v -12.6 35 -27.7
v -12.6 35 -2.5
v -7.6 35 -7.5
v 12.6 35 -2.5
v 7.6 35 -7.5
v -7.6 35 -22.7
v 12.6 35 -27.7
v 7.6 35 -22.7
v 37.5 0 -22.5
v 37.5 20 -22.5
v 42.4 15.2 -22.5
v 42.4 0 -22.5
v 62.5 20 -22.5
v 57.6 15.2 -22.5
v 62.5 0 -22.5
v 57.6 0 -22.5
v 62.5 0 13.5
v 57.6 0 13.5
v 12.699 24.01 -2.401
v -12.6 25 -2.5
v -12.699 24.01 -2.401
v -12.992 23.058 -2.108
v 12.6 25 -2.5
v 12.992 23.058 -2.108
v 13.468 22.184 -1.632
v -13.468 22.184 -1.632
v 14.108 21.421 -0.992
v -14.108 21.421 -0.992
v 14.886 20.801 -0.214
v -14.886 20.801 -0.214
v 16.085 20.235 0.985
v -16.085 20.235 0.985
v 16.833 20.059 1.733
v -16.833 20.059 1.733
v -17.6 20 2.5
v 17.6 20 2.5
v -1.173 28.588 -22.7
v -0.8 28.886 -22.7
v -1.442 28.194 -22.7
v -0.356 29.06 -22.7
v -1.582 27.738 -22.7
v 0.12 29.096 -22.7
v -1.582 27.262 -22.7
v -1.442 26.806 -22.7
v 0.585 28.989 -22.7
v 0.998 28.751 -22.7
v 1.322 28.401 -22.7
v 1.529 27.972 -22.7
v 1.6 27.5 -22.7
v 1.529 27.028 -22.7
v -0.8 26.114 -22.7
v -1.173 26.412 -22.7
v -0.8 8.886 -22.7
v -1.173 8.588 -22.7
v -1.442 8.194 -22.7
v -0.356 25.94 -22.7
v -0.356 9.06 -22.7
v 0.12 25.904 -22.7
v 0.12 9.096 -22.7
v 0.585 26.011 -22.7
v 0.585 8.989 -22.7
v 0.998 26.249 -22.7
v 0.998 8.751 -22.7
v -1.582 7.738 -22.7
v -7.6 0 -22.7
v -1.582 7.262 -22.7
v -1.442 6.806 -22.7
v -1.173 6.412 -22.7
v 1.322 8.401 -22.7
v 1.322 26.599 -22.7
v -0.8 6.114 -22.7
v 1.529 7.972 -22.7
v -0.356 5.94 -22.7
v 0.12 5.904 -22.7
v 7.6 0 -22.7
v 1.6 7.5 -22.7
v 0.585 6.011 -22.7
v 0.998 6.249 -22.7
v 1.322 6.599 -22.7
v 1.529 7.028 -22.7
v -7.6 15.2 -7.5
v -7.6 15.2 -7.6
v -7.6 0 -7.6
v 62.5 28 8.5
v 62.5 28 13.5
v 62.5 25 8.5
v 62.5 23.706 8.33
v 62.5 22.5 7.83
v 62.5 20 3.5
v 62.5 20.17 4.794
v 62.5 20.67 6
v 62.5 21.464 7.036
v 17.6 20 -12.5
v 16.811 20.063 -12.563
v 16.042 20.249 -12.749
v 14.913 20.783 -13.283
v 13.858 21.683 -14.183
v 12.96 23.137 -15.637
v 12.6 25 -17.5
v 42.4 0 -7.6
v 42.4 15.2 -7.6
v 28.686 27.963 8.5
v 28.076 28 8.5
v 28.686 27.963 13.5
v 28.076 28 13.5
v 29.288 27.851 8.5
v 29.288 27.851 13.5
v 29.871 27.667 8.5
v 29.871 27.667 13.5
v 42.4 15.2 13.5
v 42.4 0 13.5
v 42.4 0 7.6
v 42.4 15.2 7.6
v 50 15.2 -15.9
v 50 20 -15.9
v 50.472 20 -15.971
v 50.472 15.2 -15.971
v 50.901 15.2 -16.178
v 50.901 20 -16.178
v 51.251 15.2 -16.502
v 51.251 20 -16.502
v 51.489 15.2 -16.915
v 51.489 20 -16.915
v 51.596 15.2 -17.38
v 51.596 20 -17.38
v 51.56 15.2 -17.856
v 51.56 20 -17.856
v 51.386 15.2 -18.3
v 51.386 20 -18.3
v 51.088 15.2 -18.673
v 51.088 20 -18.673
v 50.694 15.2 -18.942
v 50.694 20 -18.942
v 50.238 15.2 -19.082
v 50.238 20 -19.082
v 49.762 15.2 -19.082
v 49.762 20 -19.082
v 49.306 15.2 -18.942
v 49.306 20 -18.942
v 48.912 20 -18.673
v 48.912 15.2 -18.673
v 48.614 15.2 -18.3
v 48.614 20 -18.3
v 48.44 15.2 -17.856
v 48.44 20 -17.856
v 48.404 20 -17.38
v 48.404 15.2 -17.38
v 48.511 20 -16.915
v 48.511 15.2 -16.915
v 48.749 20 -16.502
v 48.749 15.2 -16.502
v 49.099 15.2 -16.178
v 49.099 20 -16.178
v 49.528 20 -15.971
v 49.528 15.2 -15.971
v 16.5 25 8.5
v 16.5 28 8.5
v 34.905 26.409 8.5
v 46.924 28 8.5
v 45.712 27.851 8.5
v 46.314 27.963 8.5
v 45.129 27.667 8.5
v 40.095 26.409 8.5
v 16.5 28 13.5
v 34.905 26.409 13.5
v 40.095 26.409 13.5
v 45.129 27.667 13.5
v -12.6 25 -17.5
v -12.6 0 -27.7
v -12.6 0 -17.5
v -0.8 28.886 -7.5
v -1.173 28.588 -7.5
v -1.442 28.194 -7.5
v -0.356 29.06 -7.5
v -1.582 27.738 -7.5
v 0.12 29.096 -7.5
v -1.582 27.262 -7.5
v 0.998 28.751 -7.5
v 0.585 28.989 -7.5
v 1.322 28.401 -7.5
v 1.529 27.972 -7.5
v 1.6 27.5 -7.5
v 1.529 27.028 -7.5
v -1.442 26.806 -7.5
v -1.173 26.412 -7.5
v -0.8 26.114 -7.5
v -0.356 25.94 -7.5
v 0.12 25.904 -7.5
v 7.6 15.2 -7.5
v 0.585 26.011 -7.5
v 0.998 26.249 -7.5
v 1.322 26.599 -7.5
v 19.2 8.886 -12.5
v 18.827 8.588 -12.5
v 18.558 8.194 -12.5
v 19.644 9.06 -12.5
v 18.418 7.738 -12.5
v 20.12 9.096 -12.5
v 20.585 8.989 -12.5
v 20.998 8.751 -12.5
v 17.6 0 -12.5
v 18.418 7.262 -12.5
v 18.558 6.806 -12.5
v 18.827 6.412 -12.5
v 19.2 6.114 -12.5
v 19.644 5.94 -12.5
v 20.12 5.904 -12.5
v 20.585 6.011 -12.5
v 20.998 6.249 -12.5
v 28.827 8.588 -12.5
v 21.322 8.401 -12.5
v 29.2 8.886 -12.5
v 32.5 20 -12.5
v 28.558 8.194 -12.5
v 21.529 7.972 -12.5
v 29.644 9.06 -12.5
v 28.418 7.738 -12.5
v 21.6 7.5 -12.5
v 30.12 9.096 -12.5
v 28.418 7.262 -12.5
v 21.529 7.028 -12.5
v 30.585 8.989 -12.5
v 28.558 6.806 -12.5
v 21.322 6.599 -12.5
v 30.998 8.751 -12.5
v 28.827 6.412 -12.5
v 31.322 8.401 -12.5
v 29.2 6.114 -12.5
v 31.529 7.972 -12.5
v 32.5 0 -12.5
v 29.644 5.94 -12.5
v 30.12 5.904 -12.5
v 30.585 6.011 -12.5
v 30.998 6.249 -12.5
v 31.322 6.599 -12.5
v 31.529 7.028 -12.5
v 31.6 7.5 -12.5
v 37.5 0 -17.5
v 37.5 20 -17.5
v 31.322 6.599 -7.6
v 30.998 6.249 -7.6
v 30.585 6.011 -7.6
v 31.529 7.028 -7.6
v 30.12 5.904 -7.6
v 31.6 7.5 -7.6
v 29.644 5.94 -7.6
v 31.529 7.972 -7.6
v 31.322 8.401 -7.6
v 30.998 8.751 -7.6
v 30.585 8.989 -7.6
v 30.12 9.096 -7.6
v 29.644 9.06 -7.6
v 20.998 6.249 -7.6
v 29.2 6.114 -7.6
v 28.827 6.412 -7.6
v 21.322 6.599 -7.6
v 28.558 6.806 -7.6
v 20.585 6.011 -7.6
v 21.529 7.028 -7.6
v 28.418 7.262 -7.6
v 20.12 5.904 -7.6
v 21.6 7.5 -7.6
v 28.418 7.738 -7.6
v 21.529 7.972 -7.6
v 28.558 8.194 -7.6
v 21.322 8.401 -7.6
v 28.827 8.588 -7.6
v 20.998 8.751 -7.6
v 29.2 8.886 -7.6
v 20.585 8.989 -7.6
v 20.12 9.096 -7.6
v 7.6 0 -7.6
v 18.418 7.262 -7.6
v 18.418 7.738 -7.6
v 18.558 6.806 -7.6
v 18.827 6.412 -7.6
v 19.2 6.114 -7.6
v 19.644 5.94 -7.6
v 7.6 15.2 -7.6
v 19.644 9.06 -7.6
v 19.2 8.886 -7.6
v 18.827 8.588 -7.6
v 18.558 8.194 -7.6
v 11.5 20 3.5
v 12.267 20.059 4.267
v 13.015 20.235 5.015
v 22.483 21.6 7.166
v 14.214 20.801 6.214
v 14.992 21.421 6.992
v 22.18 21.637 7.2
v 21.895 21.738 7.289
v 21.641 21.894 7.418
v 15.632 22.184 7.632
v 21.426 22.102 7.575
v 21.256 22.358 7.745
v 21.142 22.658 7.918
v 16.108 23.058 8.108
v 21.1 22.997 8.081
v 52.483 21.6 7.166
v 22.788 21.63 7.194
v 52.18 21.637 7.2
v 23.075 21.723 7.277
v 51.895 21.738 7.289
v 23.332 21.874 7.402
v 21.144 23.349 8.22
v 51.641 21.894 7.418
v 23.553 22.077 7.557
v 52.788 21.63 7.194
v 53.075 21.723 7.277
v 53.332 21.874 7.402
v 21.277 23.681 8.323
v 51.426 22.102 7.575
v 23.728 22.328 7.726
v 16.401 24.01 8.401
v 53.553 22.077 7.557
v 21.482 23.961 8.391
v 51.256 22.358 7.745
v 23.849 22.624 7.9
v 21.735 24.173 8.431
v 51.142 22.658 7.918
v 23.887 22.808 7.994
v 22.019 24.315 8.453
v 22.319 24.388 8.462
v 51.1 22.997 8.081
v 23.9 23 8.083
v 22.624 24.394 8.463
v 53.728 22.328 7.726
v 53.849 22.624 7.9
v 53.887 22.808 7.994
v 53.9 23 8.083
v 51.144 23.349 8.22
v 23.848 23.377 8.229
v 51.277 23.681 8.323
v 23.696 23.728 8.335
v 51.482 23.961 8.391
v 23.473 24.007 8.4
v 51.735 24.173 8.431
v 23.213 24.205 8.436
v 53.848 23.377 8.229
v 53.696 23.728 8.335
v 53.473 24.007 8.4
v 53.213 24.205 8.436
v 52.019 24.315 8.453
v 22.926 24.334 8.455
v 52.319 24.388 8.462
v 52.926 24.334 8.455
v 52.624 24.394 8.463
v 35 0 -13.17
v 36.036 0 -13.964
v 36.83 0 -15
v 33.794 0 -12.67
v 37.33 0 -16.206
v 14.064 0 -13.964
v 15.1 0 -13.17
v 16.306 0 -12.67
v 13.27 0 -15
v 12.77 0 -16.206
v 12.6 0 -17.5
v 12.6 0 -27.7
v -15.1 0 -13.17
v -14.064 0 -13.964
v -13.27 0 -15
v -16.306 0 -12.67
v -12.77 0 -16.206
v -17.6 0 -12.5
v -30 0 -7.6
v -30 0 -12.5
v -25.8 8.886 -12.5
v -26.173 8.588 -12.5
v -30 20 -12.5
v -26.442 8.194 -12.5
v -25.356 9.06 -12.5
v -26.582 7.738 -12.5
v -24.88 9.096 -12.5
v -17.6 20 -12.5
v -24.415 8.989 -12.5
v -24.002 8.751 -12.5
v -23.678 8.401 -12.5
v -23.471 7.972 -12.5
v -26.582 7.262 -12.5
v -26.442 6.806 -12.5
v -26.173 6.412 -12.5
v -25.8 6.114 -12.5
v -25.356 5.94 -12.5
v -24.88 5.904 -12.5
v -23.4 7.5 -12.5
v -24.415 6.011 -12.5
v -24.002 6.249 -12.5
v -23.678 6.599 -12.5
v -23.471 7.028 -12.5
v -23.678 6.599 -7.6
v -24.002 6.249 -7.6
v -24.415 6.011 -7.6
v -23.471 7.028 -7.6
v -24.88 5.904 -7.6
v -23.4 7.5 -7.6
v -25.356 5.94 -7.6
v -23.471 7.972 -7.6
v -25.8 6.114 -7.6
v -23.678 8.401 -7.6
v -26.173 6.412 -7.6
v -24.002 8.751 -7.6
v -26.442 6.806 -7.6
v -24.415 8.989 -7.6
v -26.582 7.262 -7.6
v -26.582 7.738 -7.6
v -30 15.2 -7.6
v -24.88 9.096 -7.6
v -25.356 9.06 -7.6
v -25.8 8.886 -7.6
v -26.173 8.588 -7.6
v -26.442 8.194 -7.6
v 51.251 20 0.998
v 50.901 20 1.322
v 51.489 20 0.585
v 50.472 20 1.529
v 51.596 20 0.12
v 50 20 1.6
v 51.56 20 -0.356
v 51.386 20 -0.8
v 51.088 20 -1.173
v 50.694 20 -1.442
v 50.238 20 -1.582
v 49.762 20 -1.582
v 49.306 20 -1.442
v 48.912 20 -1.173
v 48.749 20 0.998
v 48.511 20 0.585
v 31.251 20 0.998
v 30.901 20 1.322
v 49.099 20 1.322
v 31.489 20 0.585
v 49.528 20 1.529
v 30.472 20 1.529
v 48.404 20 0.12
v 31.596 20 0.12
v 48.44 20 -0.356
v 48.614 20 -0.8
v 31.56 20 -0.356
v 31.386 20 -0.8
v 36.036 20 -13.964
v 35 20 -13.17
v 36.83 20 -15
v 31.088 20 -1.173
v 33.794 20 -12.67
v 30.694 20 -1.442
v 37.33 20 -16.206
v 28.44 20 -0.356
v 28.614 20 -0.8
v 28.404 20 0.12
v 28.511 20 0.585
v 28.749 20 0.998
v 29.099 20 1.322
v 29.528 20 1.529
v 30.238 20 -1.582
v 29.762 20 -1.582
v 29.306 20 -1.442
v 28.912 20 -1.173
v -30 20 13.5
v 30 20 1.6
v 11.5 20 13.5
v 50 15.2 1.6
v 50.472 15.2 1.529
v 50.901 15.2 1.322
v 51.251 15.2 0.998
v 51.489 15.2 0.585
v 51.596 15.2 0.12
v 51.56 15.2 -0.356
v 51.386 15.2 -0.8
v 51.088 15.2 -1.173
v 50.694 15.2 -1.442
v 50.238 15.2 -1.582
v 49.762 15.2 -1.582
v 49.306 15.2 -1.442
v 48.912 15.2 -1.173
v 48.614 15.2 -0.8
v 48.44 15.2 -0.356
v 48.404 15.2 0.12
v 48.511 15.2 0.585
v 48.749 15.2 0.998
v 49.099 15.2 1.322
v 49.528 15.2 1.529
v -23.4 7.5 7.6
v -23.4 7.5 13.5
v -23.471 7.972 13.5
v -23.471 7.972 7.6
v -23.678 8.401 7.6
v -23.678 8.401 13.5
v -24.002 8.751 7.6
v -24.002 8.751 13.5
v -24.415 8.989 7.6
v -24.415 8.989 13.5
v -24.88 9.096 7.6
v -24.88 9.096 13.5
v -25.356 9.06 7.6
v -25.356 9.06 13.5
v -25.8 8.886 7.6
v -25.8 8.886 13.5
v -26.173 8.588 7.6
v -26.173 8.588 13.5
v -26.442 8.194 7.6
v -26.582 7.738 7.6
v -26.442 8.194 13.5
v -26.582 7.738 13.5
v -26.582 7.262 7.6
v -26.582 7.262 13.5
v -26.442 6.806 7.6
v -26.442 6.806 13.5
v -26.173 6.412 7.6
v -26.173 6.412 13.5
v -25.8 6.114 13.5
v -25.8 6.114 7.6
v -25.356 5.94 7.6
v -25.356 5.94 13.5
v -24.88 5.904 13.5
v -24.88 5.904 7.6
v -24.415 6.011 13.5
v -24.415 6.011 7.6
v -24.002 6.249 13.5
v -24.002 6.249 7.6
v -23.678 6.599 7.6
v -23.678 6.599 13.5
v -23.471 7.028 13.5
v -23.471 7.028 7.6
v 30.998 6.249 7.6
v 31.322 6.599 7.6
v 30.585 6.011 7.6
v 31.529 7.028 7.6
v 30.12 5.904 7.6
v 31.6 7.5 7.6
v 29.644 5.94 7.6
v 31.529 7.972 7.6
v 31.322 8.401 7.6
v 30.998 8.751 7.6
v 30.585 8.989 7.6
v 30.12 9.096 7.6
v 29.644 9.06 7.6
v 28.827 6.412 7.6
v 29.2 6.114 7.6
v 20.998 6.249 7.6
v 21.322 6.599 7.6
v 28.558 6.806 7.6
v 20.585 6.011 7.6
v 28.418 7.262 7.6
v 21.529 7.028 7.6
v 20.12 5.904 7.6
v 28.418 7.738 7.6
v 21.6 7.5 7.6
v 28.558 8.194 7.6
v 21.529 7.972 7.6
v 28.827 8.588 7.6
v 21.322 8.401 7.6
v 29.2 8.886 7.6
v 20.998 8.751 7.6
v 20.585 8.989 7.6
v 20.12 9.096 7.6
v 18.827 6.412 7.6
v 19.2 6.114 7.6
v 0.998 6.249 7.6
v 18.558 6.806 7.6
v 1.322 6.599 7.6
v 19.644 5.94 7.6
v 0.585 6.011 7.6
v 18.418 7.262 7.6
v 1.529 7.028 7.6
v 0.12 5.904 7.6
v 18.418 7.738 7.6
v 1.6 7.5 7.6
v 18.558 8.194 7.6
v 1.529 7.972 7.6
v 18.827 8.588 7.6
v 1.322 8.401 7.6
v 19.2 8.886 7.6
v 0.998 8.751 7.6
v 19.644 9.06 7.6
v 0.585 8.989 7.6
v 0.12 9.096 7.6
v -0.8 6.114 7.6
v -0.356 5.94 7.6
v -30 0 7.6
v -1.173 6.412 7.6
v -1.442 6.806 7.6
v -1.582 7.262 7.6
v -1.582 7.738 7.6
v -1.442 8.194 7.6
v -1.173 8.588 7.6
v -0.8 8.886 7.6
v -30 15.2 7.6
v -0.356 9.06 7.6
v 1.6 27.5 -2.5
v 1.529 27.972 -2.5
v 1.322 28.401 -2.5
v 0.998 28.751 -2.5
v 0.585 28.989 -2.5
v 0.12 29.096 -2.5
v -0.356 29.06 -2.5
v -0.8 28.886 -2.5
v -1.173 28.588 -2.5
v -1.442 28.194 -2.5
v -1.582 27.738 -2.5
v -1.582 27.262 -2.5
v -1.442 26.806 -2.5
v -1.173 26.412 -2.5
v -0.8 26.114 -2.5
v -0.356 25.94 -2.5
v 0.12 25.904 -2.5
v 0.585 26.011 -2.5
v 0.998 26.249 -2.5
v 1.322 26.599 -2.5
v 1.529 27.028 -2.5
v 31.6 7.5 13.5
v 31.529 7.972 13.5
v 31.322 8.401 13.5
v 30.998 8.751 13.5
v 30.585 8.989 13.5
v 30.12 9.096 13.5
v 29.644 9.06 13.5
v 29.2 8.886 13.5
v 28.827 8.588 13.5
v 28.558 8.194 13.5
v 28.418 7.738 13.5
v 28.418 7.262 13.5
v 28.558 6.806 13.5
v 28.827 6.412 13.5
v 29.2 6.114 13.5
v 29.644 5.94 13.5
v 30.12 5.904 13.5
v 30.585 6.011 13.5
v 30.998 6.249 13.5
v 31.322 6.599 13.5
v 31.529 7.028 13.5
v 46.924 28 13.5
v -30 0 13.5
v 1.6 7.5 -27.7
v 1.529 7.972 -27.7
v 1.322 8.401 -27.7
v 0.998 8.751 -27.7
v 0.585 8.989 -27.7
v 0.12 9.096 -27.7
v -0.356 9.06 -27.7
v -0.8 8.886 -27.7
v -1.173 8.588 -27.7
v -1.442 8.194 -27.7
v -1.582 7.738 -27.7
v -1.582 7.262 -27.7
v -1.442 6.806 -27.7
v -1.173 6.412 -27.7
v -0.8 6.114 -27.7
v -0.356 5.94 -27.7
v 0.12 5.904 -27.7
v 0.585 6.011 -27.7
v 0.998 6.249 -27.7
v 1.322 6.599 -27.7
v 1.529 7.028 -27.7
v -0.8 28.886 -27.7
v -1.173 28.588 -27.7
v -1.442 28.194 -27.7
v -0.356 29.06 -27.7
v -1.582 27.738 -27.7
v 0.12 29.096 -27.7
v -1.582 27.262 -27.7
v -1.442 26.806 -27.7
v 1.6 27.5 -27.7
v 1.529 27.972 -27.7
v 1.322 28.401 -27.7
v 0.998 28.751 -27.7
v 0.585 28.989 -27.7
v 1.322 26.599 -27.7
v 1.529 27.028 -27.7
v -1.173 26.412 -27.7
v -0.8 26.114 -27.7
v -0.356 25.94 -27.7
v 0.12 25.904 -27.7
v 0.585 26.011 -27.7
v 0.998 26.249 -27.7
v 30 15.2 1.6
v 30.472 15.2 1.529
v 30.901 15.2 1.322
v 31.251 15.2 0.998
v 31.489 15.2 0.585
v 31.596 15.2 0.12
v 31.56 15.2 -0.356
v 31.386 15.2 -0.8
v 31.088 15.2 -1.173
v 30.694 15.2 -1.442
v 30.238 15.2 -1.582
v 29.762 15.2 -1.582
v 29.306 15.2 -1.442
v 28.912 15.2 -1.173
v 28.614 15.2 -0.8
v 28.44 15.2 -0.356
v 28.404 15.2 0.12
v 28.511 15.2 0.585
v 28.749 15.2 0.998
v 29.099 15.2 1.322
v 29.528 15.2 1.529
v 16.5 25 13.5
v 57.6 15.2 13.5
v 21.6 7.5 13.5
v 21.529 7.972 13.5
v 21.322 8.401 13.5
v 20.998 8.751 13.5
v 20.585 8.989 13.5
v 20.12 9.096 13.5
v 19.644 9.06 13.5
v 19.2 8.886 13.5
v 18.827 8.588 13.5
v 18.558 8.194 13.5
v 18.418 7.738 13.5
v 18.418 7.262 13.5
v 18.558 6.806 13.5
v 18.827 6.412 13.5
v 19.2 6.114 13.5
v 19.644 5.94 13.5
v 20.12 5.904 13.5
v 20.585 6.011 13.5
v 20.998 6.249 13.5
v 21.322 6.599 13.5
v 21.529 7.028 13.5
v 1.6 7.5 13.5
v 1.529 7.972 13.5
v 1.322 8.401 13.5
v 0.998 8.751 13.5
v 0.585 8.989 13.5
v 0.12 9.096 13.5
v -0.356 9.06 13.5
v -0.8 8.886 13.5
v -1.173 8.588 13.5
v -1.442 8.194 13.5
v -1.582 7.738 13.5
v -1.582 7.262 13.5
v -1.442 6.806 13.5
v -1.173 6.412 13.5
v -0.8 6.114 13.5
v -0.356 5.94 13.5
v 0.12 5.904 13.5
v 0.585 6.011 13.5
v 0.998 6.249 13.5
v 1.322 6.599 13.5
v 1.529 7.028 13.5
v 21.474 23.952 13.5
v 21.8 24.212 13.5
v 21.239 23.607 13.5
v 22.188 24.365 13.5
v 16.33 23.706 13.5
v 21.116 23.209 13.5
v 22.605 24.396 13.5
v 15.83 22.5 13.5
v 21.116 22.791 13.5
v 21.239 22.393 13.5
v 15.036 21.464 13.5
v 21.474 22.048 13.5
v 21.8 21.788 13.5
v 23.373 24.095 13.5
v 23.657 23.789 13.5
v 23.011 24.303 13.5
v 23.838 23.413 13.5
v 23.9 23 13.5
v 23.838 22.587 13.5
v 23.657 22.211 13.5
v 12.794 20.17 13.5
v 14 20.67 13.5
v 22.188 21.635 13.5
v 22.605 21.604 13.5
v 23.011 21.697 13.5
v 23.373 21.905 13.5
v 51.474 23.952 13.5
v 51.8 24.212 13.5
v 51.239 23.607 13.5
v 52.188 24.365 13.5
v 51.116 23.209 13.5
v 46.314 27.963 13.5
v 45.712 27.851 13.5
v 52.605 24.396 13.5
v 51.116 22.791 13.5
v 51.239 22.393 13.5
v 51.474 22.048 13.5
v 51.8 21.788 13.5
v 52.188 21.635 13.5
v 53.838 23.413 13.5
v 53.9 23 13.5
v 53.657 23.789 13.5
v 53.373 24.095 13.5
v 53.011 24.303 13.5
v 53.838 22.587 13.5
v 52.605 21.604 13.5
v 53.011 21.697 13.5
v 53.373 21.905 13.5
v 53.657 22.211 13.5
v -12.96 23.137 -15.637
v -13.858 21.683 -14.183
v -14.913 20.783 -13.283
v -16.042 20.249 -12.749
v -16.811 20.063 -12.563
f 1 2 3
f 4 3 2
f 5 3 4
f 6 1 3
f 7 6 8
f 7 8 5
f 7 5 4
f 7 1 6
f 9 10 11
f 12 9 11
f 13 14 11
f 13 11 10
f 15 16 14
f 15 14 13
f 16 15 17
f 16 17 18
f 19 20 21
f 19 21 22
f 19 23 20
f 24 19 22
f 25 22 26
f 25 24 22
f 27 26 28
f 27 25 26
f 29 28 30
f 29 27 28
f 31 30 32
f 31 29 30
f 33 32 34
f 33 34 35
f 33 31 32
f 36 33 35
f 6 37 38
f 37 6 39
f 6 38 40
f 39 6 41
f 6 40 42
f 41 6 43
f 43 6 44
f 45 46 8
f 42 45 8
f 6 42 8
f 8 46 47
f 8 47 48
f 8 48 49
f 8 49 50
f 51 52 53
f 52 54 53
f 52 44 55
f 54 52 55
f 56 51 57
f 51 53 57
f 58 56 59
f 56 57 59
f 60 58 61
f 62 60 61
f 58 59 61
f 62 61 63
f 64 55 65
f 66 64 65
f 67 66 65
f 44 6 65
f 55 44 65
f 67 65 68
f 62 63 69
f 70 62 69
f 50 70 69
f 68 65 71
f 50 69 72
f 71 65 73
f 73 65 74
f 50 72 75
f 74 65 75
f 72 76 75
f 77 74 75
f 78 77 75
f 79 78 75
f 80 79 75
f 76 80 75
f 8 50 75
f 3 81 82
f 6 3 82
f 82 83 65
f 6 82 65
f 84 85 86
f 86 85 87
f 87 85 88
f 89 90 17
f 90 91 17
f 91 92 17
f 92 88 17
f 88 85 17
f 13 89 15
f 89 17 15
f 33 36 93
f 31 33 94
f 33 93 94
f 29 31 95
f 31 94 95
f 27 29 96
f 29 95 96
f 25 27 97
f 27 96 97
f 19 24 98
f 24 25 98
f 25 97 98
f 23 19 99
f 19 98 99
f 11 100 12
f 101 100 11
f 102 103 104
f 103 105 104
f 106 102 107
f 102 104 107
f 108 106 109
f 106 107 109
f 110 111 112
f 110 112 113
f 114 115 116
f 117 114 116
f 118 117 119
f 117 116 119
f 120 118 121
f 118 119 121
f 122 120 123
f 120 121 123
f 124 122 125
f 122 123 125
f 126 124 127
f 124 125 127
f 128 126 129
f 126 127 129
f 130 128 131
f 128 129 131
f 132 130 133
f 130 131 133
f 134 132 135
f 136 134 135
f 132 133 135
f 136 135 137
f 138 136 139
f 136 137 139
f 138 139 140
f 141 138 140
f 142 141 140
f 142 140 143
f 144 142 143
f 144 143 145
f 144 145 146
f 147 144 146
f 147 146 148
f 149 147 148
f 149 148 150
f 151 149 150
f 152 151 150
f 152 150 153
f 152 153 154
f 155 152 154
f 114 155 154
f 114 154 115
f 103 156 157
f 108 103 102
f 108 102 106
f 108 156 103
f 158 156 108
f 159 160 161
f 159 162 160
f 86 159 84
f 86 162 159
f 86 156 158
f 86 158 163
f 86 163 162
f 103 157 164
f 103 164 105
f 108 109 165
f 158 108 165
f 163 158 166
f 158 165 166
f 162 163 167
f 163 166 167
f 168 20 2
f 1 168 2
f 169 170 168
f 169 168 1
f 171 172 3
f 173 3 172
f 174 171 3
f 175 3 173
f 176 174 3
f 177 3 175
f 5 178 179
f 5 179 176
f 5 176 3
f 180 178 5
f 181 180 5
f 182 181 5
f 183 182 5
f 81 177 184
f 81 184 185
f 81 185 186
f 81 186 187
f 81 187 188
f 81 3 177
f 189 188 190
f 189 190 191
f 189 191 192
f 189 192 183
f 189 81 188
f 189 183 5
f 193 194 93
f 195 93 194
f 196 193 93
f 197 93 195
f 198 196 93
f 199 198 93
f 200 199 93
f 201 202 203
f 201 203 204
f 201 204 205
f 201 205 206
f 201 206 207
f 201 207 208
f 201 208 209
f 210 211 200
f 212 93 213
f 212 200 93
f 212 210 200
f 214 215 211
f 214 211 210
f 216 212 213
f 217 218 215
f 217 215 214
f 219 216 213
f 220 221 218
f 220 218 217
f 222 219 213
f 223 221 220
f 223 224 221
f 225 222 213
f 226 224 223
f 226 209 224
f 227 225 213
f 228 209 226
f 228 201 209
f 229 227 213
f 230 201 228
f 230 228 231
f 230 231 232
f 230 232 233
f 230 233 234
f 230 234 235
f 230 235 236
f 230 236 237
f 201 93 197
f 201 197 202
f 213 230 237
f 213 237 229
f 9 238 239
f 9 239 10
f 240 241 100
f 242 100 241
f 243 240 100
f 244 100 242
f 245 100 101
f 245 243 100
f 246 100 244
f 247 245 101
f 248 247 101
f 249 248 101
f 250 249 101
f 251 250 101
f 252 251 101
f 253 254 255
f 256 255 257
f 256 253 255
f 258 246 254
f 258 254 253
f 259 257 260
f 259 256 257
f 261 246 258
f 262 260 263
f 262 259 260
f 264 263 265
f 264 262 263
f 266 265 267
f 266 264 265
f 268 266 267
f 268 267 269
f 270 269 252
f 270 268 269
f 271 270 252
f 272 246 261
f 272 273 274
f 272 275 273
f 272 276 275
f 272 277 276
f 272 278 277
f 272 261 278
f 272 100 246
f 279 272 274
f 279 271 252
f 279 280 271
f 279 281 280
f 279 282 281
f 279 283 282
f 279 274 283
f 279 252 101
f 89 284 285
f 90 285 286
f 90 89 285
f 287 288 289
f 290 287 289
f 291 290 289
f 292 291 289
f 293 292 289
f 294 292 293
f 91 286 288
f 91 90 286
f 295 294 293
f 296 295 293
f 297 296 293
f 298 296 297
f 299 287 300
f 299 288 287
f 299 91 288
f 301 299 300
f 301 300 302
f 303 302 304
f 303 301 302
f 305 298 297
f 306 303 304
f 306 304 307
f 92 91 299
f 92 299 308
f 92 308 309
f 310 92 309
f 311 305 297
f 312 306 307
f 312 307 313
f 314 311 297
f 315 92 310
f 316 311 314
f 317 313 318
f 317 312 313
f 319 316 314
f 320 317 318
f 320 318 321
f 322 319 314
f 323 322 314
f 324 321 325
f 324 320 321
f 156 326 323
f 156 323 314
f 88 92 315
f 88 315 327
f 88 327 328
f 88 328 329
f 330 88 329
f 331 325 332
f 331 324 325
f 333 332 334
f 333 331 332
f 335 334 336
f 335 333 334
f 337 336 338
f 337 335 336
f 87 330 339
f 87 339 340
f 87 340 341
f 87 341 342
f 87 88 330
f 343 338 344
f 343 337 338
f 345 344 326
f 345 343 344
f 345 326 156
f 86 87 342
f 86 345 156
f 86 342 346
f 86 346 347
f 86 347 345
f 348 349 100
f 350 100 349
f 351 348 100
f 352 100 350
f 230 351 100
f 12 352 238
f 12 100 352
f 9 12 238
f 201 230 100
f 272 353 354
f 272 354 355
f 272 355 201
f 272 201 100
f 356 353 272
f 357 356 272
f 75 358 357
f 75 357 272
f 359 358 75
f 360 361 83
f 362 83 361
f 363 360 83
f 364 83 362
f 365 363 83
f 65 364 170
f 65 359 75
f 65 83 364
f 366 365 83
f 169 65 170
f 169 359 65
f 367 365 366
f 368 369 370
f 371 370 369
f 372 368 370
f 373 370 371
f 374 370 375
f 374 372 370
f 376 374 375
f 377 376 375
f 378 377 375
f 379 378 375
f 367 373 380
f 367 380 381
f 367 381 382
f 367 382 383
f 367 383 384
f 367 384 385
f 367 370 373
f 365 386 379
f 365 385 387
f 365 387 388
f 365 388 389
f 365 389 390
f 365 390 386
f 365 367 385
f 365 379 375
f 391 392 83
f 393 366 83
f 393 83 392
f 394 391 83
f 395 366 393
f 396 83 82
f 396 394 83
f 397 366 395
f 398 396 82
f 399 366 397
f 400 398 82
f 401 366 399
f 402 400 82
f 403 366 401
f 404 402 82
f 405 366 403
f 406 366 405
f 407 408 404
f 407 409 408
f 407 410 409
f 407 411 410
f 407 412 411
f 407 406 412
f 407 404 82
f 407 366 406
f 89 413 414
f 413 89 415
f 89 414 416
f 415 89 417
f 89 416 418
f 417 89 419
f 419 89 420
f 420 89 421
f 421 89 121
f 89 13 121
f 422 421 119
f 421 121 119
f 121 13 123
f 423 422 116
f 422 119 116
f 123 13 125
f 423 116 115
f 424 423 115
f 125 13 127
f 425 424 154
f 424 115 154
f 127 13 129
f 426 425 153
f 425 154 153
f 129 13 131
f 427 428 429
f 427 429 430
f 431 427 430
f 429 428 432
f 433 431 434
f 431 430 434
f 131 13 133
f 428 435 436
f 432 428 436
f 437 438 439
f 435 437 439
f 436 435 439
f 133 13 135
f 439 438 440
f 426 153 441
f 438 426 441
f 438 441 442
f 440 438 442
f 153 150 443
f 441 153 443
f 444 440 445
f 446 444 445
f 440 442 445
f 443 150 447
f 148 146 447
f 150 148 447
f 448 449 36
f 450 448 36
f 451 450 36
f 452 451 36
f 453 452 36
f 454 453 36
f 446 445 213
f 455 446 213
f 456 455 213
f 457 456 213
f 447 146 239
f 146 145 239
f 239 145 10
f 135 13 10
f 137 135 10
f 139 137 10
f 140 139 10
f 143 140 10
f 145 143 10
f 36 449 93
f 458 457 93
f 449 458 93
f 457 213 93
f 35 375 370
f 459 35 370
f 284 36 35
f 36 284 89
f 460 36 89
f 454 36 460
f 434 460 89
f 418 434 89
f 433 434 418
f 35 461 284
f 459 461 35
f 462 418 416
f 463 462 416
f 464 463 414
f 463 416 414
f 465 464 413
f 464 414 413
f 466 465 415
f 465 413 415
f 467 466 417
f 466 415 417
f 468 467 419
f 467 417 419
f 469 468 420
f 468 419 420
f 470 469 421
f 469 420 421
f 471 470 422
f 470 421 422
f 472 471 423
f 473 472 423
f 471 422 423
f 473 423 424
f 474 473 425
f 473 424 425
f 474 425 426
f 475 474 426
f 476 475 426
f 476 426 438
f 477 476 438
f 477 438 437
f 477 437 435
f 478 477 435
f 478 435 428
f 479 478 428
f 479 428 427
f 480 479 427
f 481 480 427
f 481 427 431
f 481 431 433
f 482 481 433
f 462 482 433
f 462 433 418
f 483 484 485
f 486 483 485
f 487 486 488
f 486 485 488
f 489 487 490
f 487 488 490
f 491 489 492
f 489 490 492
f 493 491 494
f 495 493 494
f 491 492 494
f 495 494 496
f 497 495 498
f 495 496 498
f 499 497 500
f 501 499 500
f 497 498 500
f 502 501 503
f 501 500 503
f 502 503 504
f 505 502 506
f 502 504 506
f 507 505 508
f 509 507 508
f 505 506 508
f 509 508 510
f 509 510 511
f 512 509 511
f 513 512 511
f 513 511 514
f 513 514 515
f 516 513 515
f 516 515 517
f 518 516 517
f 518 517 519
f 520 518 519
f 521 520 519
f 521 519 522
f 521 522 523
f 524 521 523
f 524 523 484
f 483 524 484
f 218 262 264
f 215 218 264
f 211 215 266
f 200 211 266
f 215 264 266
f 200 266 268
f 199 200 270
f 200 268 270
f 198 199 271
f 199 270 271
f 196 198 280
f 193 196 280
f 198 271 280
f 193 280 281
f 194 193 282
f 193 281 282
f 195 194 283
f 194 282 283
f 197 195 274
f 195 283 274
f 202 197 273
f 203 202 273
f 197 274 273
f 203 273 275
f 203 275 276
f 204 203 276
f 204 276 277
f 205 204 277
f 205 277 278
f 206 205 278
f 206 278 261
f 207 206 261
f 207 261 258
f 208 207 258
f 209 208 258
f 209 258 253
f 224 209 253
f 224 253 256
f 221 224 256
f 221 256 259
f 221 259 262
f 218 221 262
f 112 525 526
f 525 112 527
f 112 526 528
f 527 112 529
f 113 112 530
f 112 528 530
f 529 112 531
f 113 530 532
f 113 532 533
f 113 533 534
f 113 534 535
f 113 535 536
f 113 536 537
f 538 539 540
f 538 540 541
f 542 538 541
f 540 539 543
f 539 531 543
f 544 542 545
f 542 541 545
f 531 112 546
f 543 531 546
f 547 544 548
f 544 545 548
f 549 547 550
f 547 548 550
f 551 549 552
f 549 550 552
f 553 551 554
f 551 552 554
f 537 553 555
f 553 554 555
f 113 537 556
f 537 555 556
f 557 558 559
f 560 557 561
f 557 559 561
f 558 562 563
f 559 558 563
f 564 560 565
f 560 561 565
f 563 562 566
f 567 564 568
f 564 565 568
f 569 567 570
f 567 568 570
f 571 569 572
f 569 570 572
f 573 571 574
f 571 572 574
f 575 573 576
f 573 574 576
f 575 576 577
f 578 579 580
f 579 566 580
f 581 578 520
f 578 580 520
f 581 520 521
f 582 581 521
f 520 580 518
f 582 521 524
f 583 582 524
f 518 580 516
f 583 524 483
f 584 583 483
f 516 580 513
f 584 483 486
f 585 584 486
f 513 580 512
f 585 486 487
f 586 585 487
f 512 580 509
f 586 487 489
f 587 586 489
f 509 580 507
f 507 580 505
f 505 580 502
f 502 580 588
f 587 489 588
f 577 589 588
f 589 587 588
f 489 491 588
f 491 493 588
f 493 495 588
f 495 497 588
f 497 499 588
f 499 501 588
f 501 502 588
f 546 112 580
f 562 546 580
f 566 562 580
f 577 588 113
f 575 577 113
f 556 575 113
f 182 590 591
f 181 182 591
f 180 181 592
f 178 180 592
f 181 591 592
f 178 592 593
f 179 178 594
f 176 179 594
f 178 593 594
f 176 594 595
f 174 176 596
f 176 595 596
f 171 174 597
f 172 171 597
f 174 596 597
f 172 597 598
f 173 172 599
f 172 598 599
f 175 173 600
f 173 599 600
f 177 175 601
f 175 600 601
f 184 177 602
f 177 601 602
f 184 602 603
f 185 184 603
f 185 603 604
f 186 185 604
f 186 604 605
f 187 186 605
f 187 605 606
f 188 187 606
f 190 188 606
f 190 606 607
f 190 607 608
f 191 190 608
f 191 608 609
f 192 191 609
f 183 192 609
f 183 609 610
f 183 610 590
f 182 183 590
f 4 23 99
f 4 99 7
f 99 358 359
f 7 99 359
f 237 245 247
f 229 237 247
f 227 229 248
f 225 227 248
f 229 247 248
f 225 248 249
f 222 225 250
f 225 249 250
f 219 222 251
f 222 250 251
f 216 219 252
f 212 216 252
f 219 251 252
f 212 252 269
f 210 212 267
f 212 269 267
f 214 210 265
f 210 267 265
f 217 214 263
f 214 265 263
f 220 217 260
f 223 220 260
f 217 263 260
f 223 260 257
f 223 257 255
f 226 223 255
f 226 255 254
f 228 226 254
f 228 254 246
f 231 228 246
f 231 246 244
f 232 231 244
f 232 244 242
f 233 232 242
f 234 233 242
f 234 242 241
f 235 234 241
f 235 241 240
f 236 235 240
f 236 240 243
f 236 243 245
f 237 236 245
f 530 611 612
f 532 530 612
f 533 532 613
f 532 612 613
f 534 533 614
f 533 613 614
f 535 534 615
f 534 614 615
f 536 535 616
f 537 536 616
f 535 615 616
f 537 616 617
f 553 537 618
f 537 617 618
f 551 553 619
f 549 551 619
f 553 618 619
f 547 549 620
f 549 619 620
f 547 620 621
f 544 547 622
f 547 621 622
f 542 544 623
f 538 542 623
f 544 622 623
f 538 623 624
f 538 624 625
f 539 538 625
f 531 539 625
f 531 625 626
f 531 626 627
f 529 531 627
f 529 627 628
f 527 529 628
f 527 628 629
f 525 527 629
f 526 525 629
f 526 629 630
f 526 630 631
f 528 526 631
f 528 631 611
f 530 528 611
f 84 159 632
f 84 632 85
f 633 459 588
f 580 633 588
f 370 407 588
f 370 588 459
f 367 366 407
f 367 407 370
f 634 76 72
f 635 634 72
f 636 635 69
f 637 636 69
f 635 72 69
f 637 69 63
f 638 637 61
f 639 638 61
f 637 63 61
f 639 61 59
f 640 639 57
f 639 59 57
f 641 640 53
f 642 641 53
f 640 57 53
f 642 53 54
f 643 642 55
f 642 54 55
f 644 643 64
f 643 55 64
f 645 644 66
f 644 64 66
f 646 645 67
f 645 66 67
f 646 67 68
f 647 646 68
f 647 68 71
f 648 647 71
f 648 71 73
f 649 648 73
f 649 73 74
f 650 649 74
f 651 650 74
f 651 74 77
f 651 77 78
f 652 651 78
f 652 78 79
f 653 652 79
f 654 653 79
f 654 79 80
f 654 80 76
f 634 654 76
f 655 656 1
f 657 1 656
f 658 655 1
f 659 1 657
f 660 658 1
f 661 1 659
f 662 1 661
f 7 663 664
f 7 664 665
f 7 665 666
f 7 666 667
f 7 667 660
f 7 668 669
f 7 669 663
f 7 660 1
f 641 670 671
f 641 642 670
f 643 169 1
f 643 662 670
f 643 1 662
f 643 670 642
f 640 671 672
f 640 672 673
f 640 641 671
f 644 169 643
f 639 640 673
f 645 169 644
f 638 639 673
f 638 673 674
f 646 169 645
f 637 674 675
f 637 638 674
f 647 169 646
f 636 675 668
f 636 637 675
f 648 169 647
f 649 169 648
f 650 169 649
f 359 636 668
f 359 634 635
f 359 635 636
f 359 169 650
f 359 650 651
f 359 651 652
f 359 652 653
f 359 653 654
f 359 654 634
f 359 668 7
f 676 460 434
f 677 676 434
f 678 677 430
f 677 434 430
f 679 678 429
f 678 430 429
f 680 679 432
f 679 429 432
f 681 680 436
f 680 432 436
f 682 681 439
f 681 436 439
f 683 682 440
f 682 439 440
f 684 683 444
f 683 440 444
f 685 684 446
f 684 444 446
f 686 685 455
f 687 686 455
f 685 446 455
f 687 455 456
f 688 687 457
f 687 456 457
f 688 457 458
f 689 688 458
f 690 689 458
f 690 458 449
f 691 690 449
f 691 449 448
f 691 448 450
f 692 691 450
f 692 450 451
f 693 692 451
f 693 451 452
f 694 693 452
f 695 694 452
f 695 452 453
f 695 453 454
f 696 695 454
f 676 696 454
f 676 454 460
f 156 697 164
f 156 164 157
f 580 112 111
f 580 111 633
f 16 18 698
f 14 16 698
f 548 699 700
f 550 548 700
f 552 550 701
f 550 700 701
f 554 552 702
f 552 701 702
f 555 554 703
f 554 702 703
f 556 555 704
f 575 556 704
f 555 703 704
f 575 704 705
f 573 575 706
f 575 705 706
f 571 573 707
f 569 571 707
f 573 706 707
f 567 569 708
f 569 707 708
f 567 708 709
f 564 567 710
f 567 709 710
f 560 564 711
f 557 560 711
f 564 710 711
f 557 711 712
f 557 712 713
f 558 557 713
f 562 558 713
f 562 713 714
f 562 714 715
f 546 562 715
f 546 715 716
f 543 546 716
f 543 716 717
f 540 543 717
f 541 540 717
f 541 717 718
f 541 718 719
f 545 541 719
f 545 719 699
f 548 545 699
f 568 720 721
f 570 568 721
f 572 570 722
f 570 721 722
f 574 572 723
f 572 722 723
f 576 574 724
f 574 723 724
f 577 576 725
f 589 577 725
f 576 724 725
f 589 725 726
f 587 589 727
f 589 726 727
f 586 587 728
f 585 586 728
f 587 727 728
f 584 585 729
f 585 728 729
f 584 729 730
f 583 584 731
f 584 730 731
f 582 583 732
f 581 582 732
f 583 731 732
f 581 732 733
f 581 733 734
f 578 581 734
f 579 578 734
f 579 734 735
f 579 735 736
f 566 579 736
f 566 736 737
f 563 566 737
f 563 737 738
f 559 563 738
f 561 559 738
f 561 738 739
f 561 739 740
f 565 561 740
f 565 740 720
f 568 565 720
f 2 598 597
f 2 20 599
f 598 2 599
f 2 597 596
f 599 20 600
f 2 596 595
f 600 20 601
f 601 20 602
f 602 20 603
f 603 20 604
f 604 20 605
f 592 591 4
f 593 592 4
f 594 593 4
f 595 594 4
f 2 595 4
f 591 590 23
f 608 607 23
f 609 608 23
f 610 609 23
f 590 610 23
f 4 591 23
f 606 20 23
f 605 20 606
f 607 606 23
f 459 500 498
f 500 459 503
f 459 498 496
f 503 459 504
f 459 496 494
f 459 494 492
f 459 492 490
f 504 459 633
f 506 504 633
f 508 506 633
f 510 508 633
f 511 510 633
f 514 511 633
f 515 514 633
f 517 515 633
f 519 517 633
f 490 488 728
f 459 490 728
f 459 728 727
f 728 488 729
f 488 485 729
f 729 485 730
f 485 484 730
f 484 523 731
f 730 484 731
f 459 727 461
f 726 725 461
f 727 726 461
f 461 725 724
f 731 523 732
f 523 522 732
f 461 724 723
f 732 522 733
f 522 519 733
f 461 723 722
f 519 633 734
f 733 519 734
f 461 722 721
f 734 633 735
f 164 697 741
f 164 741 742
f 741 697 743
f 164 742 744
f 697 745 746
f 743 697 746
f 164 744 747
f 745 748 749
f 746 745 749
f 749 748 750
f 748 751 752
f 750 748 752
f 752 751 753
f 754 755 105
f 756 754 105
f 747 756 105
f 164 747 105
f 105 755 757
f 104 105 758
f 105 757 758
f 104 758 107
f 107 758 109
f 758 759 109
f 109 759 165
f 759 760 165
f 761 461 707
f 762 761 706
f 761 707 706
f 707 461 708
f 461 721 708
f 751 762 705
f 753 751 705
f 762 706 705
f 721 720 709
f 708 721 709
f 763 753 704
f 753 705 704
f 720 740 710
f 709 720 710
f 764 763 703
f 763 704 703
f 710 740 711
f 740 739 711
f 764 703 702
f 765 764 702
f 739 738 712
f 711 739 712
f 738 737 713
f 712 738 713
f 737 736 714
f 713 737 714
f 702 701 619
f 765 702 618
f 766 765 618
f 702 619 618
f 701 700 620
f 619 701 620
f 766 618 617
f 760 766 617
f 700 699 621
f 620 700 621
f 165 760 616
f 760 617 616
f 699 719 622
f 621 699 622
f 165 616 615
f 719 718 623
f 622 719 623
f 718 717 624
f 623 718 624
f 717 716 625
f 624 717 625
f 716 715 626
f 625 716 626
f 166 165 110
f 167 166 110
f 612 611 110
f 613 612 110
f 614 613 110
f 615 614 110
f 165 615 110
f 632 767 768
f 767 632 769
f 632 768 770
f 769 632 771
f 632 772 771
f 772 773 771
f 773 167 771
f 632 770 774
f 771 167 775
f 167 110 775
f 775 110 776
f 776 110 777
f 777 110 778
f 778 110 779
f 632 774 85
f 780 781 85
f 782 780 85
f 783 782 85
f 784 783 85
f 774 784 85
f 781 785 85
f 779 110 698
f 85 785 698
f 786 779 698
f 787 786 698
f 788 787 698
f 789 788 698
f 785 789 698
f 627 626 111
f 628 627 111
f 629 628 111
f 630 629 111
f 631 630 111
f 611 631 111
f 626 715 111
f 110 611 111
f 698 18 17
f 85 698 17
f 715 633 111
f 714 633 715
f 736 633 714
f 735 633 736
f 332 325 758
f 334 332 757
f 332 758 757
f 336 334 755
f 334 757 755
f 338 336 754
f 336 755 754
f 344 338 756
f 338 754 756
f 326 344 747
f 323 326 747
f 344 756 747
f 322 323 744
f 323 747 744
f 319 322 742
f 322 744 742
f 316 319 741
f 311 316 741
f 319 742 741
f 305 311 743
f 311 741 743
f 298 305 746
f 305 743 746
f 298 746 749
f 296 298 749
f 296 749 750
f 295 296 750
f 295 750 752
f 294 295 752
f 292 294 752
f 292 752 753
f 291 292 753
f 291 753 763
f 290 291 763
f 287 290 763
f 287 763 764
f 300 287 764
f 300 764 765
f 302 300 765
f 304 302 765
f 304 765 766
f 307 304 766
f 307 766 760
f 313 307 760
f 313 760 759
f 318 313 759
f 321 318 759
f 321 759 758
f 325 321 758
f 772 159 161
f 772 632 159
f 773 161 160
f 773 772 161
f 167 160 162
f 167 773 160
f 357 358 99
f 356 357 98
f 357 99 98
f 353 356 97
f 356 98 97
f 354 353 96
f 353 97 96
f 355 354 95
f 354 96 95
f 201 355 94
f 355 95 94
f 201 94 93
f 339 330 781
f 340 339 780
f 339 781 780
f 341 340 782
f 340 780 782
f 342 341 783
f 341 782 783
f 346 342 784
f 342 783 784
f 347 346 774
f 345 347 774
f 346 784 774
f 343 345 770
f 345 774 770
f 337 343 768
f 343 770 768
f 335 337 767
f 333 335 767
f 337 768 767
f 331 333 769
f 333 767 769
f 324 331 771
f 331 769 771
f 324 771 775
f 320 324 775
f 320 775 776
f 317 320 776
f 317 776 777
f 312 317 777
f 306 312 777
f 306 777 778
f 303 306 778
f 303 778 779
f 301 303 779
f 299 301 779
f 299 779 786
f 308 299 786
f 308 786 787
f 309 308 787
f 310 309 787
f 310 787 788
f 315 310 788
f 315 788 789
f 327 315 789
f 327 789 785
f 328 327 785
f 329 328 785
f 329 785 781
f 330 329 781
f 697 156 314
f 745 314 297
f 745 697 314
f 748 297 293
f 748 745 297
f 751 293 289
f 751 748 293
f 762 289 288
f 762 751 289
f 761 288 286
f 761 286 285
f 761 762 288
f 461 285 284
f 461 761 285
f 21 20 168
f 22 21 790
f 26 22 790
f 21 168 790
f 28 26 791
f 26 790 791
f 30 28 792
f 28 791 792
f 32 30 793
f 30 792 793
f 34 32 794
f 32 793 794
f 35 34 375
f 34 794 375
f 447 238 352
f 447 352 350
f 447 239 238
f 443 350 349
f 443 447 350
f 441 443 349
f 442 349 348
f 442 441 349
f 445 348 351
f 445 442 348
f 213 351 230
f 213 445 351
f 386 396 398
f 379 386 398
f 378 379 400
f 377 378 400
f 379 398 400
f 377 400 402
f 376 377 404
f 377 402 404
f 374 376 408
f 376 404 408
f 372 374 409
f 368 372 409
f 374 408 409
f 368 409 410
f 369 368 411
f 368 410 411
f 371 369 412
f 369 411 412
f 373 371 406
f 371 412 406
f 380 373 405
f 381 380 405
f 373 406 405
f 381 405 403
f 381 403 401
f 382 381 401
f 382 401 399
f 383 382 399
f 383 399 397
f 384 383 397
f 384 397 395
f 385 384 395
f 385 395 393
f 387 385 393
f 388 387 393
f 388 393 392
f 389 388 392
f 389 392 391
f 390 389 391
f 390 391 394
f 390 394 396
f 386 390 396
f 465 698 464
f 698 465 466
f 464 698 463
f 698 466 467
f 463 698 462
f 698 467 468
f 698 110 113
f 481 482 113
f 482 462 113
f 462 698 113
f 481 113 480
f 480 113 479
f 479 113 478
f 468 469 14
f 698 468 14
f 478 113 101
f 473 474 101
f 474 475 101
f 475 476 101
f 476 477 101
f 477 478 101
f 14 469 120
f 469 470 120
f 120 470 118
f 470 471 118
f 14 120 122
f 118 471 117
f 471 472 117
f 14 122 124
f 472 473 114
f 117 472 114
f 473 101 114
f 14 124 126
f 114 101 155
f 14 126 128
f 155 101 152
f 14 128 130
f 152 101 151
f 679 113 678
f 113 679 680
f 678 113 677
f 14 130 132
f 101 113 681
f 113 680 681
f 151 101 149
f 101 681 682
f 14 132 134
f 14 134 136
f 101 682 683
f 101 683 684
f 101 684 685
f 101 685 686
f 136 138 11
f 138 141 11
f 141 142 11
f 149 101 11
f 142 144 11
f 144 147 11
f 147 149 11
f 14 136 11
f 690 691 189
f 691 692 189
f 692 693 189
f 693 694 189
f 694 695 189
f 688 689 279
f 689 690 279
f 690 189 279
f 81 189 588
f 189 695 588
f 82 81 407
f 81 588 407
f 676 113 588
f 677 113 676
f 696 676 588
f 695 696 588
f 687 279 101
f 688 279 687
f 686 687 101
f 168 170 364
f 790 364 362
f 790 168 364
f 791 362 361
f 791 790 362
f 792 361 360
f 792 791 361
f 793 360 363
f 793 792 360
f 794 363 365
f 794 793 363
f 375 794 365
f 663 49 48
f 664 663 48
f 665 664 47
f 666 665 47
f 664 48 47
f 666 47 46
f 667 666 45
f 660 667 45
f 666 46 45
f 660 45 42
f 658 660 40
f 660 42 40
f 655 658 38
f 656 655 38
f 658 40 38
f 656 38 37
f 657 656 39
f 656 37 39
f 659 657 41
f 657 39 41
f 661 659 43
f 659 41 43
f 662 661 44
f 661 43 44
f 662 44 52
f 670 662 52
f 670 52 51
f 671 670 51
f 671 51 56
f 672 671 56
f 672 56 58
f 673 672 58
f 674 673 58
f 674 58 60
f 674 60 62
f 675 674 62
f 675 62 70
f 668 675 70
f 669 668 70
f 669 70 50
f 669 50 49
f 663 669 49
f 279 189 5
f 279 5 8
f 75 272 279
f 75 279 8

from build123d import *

# Parameters (mm, degrees)
SKETCH_1_W          = 15.2
SKETCH_1_H          = 15.2
EXTRUDE_1_DEPTH     = 20
SKETCH_2_W          = 25.2
SKETCH_2_H          = 25.2
SKETCH_2_W_2        = 15.2
SKETCH_2_H_2        = 15.2
EXTRUDE_2_DEPTH     = 15
SKETCH_3_W          = 15.2
SKETCH_3_H          = 15.2
CUT_EXTRUDE_1_DEPTH = 80
SKETCH_4_R          = 1.6
CUT_EXTRUDE_2_DEPTH = 83.635888087
FILLET_1_R          = 5
SKETCH_5_W          = 15.2
SKETCH_5_H          = 15.2
CUT_EXTRUDE_3_DEPTH = 83.635888087
CUT_EXTRUDE_5_REACH = 73.229
SKETCH_7_R          = 1.6
SKETCH_8_W          = 46
SKETCH_8_H          = 5
EXTRUDE_3_DEPTH     = 8
FILLET_2_R          = 5
CUT_EXTRUDE_6_REACH = 84.636
SKETCH_9_R          = 21.25
SKETCH_9_R_2        = 1.4
FILLET_3_R          = 5


with BuildPart() as part:
    # 草图1 → 凸台-拉伸1 (new body)
    with BuildSketch(Plane(origin=(0, 0, 0), x_dir=(1, 0, 0), z_dir=(0, 1, 0))):
        Polygon((-30, 12.5), (-12.6, 12.5), (-12.6, 27.7), (12.6, 27.7), (12.6, 12.5), (37.5, 12.5), (37.5, 22.5), (62.5, 22.5), (62.5, -13.5), (-30, -13.5), align=None)
        with Locations((0, 15.1)):
            Rectangle(SKETCH_1_W, SKETCH_1_H, mode=Mode.SUBTRACT)
    extrude(amount=EXTRUDE_1_DEPTH)

    # 草图2 → 凸台-拉伸2 (add)
    with BuildSketch(Plane(origin=(0, 20, 0), x_dir=(1, 0, 0), z_dir=(0, 1, 0))):
        with Locations((0, 15.1)):
            Rectangle(SKETCH_2_W, SKETCH_2_H)
        with Locations((0, 15.1)):
            Rectangle(SKETCH_2_W_2, SKETCH_2_H_2, mode=Mode.SUBTRACT)
    extrude(amount=EXTRUDE_2_DEPTH)

    # 草图3 → 切除-拉伸1 (cut)
    with BuildSketch(Plane(origin=(-30, 0, 0), x_dir=(0, 0, -1), z_dir=(1, 0, 0))):
        with Locations((0, 7.6)):
            Rectangle(SKETCH_3_W, SKETCH_3_H)
    extrude(amount=CUT_EXTRUDE_1_DEPTH, mode=Mode.SUBTRACT)

    # 草图4 → 切除-拉伸2 (cut, through all)
    with BuildSketch(Plane.XY.offset(13.5)):
        with Locations((0, 7.5)):
            Circle(SKETCH_4_R)
        with Locations((20, 7.5)):
            Circle(SKETCH_4_R)
        with Locations((-25, 7.5)):
            Circle(SKETCH_4_R)
        with Locations((0, 27.5)):
            Circle(SKETCH_4_R)
        with Locations((30, 7.5)):
            Circle(SKETCH_4_R)
    extrude(amount=-CUT_EXTRUDE_2_DEPTH, mode=Mode.SUBTRACT)

    # 圆角1
    fillet_1_edges = [part.edges().sort_by_distance(p)[0] for p in [
        (-12.6, 10, -12.5),
        (12.6, 10, -12.5),
        (37.5, 10, -12.5),
        (-12.6, 20, -7.5),
        (0, 20, -2.5),
        (12.6, 20, -7.5),
    ]]
    fillet(fillet_1_edges, radius=FILLET_1_R)

    # 草图5 → 切除-拉伸3 (cut, through all)
    with BuildSketch(Plane.XY.offset(13.5)):
        with Locations((50, 7.6)):
            Rectangle(SKETCH_5_W, SKETCH_5_H)
    extrude(amount=-CUT_EXTRUDE_3_DEPTH, mode=Mode.SUBTRACT)

    # 草图7 → 切除-拉伸5 (cut, up to next)
    with BuildSketch(Plane(origin=(0, 20, 0), x_dir=(1, 0, 0), z_dir=(0, 1, 0)), mode=Mode.PRIVATE) as cut_extrude_5_sk1:
        with Locations(Location((50, 0, 0), (0, 0, 270))):
            Circle(SKETCH_7_R)
    cut_extrude_5_tool1 = extrude(cut_extrude_5_sk1.sketch, amount=-CUT_EXTRUDE_5_REACH, mode=Mode.PRIVATE) & part.part
    # 草图7 → 切除-拉伸5 (cut, up to next)
    with BuildSketch(Plane(origin=(0, 20, 0), x_dir=(1, 0, 0), z_dir=(0, 1, 0)), mode=Mode.PRIVATE) as cut_extrude_5_sk2:
        with Locations(Location((30, 0, 0), (0, 0, 270))):
            Circle(SKETCH_7_R)
    cut_extrude_5_tool2 = extrude(cut_extrude_5_sk2.sketch, amount=-CUT_EXTRUDE_5_REACH, mode=Mode.PRIVATE) & part.part
    # 草图7 → 切除-拉伸5 (cut, up to next)
    with BuildSketch(Plane(origin=(0, 20, 0), x_dir=(1, 0, 0), z_dir=(0, 1, 0)), mode=Mode.PRIVATE) as cut_extrude_5_sk3:
        with Locations(Location((50, 17.5, 0), (0, 0, 270))):
            Circle(SKETCH_7_R)
    cut_extrude_5_tool3 = extrude(cut_extrude_5_sk3.sketch, amount=-CUT_EXTRUDE_5_REACH, mode=Mode.PRIVATE) & part.part
    add(cut_extrude_5_tool1.solids().sort_by_distance((50, 20, 0))[0], mode=Mode.SUBTRACT)
    add(cut_extrude_5_tool2.solids().sort_by_distance((30, 20, 0))[0], mode=Mode.SUBTRACT)
    add(cut_extrude_5_tool3.solids().sort_by_distance((50, 20, -17.5))[0], mode=Mode.SUBTRACT)

    # 草图8 → 凸台-拉伸3 (add)
    with BuildSketch(Plane(origin=(0, 20, 0), x_dir=(1, 0, 0), z_dir=(0, 1, 0))):
        with Locations((39.5, -11)):
            Rectangle(SKETCH_8_W, SKETCH_8_H)
    extrude(amount=EXTRUDE_3_DEPTH)

    # 圆角2
    fillet_2_edges = [part.edges().sort_by_distance(p)[0] for p in [
        (39.5, 20, 8.5),
    ]]
    fillet(fillet_2_edges, radius=FILLET_2_R)

    # 草图9 → 切除-拉伸6 (cut, up to next)
    with BuildSketch(Plane.XY.offset(13.5), mode=Mode.PRIVATE) as cut_extrude_6_sk1:
        with Locations((37.5, 47.5)):
            Circle(SKETCH_9_R)
    cut_extrude_6_tool1 = extrude(cut_extrude_6_sk1.sketch, amount=-CUT_EXTRUDE_6_REACH, mode=Mode.PRIVATE) & part.part
    # 草图9 → 切除-拉伸6 (cut, up to next)
    with BuildSketch(Plane.XY.offset(13.5), mode=Mode.PRIVATE) as cut_extrude_6_sk2:
        with Locations((22.5, 23)):
            Circle(SKETCH_9_R_2)
    cut_extrude_6_tool2 = extrude(cut_extrude_6_sk2.sketch, amount=-CUT_EXTRUDE_6_REACH, mode=Mode.PRIVATE) & part.part
    # 草图9 → 切除-拉伸6 (cut, up to next)
    with BuildSketch(Plane.XY.offset(13.5), mode=Mode.PRIVATE) as cut_extrude_6_sk3:
        with Locations((52.5, 23)):
            Circle(SKETCH_9_R_2)
    cut_extrude_6_tool3 = extrude(cut_extrude_6_sk3.sketch, amount=-CUT_EXTRUDE_6_REACH, mode=Mode.PRIVATE) & part.part
    add(cut_extrude_6_tool1.solids().sort_by_distance((37.5, 47.5, 13.5))[0], mode=Mode.SUBTRACT)
    add(cut_extrude_6_tool2.solids().sort_by_distance((22.5, 23, 13.5))[0], mode=Mode.SUBTRACT)
    add(cut_extrude_6_tool3.solids().sort_by_distance((52.5, 23, 13.5))[0], mode=Mode.SUBTRACT)

    # 圆角3
    fillet_3_edges = [part.edges().sort_by_distance(p)[0] for p in [
        (16.5, 20, 8.5),
        (45.944672877, 28, 11),
        (29.055327123, 28, 11),
    ]]
    fillet(fillet_3_edges, radius=FILLET_3_R)


solid = part.part
